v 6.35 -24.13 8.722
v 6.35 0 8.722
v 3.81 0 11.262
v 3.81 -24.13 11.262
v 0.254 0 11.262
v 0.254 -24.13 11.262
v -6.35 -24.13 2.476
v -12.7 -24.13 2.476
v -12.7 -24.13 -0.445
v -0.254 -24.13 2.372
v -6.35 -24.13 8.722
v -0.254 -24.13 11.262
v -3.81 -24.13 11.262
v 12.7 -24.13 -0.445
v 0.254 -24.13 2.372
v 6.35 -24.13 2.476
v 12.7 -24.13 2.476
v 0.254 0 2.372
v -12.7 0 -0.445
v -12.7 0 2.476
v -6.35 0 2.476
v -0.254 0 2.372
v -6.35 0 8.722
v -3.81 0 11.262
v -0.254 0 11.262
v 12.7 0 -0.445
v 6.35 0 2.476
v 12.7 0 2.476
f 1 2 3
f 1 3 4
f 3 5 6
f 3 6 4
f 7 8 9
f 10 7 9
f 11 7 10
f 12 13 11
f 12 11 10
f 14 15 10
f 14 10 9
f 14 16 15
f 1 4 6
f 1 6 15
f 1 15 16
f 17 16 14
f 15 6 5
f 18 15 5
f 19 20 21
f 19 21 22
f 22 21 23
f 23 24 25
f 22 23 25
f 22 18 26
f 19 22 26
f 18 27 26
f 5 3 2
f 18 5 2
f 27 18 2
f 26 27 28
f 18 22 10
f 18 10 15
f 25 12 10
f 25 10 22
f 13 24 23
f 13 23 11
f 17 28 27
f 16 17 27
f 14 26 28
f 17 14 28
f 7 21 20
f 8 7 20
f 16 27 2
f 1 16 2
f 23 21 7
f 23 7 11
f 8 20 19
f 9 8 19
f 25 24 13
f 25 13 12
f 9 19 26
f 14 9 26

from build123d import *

# Parameters (mm, degrees)
F0_W     = 12.7
F0_H     = 8.786774
F1_DEPTH = 24.13
F2_W     = 0.508
F2_H     = 24.13
F3_DEPTH = 8.89
F4_SIZE  = 2.54


with BuildPart() as f1:
    # F0 (on Front) → F1 (new body)
    with BuildSketch(Plane.XZ):
        Polygon((-12.7, 2.475597), (-12.7, -0.445403), (12.7, -0.445403), (12.7, 2.475597), (6.35, 2.475597), (-6.35, 2.475597), align=None)
        with Locations((0, 6.868984)):
            Rectangle(F0_W, F0_H)
    extrude(amount=F1_DEPTH)

    # F2 (on face) → F3 (cut)
    with BuildSketch(Plane.XY.offset(11.262371)):
        with Locations((0, -12.065)):
            Rectangle(F2_W, F2_H)
    extrude(amount=-F3_DEPTH, mode=Mode.SUBTRACT)

    # F4
    f4_edges = [f1.edges().sort_by_distance(p)[0] for p in [
        (-6.35, -12.065, 11.262371),
        (6.35, -12.065, 11.262371),
    ]]
    chamfer(f4_edges, length=F4_SIZE)


solid = f1.part
